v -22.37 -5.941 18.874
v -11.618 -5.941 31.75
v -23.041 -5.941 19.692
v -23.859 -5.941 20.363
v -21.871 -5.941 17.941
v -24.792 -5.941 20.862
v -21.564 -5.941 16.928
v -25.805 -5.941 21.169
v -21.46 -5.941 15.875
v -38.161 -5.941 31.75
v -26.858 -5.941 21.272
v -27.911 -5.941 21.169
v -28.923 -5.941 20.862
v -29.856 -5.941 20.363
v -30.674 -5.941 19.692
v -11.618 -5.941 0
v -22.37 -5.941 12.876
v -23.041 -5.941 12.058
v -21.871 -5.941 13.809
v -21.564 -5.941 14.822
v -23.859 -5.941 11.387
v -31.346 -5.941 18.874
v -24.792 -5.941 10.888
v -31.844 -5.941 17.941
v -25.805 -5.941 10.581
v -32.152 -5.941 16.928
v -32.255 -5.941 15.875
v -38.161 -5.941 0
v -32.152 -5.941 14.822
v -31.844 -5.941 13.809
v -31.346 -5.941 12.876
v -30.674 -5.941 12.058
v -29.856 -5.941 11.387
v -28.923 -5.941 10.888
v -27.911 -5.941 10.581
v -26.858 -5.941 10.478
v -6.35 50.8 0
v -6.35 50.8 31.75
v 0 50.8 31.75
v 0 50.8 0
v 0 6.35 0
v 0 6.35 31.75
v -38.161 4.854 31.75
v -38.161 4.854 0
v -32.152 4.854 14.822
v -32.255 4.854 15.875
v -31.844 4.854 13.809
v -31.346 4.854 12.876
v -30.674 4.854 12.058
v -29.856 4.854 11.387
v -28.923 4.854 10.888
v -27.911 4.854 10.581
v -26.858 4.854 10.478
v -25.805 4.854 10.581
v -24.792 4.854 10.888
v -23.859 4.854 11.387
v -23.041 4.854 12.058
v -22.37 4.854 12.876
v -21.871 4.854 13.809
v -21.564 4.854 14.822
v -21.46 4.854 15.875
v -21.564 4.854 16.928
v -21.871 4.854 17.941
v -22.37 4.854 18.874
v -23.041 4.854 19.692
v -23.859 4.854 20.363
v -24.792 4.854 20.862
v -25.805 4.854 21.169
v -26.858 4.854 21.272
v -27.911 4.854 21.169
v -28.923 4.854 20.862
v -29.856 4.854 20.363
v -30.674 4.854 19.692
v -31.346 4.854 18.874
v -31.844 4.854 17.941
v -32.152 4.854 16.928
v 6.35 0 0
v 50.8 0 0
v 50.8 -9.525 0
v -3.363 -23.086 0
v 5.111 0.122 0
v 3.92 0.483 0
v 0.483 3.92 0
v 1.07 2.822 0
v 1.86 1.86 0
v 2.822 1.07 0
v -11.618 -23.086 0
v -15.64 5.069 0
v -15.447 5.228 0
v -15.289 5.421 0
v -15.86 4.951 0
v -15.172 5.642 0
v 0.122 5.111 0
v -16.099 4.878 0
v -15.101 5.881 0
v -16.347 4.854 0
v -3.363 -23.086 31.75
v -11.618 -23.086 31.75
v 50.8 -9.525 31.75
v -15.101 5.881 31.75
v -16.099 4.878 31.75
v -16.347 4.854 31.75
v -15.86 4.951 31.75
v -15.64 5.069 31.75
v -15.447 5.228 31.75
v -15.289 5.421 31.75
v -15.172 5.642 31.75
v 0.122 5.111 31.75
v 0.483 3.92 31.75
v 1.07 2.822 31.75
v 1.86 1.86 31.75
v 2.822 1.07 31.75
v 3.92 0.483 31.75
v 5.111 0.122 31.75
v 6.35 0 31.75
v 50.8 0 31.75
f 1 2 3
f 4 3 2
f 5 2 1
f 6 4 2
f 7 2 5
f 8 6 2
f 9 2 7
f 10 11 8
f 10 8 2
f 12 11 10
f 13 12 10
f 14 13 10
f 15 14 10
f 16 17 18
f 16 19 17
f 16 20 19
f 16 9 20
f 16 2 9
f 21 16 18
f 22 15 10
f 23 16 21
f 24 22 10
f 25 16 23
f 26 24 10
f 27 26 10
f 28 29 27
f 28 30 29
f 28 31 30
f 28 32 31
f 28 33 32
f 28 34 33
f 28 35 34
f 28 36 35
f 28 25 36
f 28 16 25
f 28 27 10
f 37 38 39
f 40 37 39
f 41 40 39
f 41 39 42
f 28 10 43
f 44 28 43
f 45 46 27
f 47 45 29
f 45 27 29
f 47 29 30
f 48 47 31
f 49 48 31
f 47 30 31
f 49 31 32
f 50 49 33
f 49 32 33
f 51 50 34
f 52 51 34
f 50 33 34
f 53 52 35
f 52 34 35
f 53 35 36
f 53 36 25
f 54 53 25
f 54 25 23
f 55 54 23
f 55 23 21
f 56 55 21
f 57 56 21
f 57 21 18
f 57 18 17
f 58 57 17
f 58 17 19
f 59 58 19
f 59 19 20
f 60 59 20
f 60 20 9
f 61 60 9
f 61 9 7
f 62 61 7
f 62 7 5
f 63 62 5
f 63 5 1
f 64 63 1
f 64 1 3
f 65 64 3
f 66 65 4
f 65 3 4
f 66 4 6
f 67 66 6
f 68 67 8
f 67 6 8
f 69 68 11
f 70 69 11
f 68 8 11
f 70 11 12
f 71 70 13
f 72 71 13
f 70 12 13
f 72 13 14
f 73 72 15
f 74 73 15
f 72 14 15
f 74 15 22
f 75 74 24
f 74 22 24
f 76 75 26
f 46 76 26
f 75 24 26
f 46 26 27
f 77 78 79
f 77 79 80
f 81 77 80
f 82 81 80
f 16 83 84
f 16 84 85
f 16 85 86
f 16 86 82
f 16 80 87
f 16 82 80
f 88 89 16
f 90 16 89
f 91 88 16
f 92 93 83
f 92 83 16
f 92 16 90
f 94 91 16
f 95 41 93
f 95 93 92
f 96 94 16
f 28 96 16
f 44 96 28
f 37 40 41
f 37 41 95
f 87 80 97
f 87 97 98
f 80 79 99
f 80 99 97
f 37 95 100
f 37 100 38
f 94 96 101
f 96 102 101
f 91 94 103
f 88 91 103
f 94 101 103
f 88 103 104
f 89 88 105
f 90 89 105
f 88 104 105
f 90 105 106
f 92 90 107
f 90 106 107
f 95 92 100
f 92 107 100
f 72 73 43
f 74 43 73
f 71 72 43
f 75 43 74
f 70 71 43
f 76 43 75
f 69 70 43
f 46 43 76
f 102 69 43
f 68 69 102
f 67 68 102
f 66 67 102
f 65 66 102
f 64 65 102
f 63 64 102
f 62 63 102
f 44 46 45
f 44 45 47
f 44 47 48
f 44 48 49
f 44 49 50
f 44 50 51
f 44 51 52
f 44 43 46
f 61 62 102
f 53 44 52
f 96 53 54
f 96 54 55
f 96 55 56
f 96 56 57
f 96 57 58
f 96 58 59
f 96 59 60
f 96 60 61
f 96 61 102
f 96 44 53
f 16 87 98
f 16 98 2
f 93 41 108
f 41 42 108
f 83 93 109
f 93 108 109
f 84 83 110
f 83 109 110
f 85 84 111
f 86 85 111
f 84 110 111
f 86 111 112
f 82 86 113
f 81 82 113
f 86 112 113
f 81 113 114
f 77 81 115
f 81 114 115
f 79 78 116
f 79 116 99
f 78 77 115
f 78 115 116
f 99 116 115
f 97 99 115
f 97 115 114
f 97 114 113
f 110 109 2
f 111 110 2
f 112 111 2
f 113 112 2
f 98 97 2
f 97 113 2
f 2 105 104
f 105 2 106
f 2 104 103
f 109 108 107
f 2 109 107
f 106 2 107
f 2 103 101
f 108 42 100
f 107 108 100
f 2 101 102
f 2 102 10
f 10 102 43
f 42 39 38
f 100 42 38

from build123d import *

# Parameters (mm, degrees)
BOSS_EXTRUDE1_DEPTH          = 31.75
F_3_8_0_375_DIAMETER_HOLE1_D = 10.795
FILLET1_R                    = 1.27
FILLET2_R                    = 6.35


with BuildPart() as part:
    # Sketch1 → Boss-Extrude1 (new body)
    with BuildSketch(Plane.XY):
        Polygon((0, 0), (50.8, 0), (50.8, -9.525), (-3.3628076, -23.086314), (-11.6178076, -23.086314), (-11.6178076, -5.941314), (-38.1608076, -5.941314), (-38.1608076, 4.853686), (-15.3008076, 4.853686), (-6.35, 50.8), (0, 50.8), align=None)
    extrude(amount=BOSS_EXTRUDE1_DEPTH)

    # 3/8 (0.375) Diameter Hole1 (through all)
    with Locations(Plane(origin=(0, 4.853686, 0), x_dir=(1, 0, 0), z_dir=(0, 1, 0))):
        with Locations((-26.8578076, -15.875)):
            Hole(F_3_8_0_375_DIAMETER_HOLE1_D / 2)

    # Fillet1
    fillet1_edges = [part.edges().sort_by_distance(p)[0] for p in [
        (-15.3008076, 4.853686, 15.875),
    ]]
    fillet(fillet1_edges, radius=FILLET1_R)

    # Fillet2
    fillet2_edges = [part.edges().sort_by_distance(p)[0] for p in [
        (0, 0, 15.875),
    ]]
    fillet(fillet2_edges, radius=FILLET2_R)


solid = part.part
